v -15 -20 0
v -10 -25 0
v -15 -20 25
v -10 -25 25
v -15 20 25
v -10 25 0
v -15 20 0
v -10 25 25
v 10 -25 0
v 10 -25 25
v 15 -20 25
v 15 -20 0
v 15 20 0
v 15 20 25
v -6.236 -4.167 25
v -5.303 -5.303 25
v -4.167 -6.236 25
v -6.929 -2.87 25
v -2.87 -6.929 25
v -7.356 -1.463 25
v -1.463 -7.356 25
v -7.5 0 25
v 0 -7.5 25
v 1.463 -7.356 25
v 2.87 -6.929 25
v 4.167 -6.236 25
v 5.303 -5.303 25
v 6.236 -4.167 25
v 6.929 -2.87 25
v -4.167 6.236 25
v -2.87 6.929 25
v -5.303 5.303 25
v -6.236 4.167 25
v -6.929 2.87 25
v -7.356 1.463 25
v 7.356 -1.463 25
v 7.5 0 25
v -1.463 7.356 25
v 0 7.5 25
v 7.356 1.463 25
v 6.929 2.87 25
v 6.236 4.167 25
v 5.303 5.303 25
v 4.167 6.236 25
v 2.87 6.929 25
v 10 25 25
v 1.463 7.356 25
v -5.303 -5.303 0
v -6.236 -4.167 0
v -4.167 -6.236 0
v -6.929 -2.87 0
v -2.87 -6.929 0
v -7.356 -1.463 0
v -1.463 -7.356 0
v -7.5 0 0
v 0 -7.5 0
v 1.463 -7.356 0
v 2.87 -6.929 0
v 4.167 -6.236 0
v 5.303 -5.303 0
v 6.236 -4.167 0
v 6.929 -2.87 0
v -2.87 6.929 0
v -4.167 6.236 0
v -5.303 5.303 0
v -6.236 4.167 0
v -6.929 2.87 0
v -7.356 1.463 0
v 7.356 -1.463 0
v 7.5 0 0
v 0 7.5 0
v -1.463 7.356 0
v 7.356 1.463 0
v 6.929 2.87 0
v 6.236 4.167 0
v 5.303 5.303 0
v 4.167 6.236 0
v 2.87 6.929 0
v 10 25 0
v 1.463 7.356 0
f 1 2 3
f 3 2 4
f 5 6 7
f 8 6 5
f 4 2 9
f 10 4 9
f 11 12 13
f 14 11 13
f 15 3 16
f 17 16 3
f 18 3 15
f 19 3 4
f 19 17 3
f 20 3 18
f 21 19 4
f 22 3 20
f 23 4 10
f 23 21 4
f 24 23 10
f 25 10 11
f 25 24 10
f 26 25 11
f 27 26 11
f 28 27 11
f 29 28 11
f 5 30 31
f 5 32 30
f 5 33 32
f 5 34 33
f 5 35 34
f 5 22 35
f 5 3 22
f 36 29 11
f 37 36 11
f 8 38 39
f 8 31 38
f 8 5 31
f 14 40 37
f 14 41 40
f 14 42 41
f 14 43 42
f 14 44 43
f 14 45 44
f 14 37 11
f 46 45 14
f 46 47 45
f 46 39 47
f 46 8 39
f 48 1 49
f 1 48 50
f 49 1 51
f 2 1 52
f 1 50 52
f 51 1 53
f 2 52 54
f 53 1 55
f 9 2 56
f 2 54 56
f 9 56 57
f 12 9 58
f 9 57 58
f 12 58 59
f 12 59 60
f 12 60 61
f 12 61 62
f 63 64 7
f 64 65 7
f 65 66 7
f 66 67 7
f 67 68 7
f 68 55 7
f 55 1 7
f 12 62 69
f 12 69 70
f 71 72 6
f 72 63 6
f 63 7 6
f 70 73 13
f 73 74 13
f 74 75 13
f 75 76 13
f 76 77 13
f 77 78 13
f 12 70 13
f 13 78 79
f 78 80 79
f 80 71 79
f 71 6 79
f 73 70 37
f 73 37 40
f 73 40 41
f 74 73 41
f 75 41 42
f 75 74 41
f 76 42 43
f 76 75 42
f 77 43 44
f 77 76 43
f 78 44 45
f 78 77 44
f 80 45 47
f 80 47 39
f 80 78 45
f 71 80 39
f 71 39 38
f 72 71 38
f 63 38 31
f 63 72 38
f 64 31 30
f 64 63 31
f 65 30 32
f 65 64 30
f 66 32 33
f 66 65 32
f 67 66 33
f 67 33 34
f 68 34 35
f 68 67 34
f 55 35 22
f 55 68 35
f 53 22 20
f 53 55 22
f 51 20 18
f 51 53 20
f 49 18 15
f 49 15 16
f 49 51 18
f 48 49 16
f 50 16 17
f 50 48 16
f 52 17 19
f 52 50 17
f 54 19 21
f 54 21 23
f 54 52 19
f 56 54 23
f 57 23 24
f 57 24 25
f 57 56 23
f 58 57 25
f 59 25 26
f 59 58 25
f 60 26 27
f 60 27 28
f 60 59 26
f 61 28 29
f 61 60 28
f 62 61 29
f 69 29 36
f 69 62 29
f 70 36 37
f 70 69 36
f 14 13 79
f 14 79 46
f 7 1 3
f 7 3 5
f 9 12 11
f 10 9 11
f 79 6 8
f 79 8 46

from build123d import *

# Parameters (mm, degrees)
F0_W     = 30
F0_H     = 50
F0_R     = 7.5
F1_DEPTH = 25
F2_SIZE  = 5


with BuildPart() as f1:
    # F0 (on Top) → F1 (new body)
    with BuildSketch(Plane.XY):
        Rectangle(F0_W, F0_H)
        Circle(F0_R, mode=Mode.SUBTRACT)
    extrude(amount=F1_DEPTH)

    # F2
    f2_edges = [f1.edges().sort_by_distance(p)[0] for p in [
        (15, -25, 12.5),
        (-15, -25, 12.5),
        (15, 25, 12.5),
        (-15, 25, 12.5),
    ]]
    chamfer(f2_edges, length=F2_SIZE)


solid = f1.part
